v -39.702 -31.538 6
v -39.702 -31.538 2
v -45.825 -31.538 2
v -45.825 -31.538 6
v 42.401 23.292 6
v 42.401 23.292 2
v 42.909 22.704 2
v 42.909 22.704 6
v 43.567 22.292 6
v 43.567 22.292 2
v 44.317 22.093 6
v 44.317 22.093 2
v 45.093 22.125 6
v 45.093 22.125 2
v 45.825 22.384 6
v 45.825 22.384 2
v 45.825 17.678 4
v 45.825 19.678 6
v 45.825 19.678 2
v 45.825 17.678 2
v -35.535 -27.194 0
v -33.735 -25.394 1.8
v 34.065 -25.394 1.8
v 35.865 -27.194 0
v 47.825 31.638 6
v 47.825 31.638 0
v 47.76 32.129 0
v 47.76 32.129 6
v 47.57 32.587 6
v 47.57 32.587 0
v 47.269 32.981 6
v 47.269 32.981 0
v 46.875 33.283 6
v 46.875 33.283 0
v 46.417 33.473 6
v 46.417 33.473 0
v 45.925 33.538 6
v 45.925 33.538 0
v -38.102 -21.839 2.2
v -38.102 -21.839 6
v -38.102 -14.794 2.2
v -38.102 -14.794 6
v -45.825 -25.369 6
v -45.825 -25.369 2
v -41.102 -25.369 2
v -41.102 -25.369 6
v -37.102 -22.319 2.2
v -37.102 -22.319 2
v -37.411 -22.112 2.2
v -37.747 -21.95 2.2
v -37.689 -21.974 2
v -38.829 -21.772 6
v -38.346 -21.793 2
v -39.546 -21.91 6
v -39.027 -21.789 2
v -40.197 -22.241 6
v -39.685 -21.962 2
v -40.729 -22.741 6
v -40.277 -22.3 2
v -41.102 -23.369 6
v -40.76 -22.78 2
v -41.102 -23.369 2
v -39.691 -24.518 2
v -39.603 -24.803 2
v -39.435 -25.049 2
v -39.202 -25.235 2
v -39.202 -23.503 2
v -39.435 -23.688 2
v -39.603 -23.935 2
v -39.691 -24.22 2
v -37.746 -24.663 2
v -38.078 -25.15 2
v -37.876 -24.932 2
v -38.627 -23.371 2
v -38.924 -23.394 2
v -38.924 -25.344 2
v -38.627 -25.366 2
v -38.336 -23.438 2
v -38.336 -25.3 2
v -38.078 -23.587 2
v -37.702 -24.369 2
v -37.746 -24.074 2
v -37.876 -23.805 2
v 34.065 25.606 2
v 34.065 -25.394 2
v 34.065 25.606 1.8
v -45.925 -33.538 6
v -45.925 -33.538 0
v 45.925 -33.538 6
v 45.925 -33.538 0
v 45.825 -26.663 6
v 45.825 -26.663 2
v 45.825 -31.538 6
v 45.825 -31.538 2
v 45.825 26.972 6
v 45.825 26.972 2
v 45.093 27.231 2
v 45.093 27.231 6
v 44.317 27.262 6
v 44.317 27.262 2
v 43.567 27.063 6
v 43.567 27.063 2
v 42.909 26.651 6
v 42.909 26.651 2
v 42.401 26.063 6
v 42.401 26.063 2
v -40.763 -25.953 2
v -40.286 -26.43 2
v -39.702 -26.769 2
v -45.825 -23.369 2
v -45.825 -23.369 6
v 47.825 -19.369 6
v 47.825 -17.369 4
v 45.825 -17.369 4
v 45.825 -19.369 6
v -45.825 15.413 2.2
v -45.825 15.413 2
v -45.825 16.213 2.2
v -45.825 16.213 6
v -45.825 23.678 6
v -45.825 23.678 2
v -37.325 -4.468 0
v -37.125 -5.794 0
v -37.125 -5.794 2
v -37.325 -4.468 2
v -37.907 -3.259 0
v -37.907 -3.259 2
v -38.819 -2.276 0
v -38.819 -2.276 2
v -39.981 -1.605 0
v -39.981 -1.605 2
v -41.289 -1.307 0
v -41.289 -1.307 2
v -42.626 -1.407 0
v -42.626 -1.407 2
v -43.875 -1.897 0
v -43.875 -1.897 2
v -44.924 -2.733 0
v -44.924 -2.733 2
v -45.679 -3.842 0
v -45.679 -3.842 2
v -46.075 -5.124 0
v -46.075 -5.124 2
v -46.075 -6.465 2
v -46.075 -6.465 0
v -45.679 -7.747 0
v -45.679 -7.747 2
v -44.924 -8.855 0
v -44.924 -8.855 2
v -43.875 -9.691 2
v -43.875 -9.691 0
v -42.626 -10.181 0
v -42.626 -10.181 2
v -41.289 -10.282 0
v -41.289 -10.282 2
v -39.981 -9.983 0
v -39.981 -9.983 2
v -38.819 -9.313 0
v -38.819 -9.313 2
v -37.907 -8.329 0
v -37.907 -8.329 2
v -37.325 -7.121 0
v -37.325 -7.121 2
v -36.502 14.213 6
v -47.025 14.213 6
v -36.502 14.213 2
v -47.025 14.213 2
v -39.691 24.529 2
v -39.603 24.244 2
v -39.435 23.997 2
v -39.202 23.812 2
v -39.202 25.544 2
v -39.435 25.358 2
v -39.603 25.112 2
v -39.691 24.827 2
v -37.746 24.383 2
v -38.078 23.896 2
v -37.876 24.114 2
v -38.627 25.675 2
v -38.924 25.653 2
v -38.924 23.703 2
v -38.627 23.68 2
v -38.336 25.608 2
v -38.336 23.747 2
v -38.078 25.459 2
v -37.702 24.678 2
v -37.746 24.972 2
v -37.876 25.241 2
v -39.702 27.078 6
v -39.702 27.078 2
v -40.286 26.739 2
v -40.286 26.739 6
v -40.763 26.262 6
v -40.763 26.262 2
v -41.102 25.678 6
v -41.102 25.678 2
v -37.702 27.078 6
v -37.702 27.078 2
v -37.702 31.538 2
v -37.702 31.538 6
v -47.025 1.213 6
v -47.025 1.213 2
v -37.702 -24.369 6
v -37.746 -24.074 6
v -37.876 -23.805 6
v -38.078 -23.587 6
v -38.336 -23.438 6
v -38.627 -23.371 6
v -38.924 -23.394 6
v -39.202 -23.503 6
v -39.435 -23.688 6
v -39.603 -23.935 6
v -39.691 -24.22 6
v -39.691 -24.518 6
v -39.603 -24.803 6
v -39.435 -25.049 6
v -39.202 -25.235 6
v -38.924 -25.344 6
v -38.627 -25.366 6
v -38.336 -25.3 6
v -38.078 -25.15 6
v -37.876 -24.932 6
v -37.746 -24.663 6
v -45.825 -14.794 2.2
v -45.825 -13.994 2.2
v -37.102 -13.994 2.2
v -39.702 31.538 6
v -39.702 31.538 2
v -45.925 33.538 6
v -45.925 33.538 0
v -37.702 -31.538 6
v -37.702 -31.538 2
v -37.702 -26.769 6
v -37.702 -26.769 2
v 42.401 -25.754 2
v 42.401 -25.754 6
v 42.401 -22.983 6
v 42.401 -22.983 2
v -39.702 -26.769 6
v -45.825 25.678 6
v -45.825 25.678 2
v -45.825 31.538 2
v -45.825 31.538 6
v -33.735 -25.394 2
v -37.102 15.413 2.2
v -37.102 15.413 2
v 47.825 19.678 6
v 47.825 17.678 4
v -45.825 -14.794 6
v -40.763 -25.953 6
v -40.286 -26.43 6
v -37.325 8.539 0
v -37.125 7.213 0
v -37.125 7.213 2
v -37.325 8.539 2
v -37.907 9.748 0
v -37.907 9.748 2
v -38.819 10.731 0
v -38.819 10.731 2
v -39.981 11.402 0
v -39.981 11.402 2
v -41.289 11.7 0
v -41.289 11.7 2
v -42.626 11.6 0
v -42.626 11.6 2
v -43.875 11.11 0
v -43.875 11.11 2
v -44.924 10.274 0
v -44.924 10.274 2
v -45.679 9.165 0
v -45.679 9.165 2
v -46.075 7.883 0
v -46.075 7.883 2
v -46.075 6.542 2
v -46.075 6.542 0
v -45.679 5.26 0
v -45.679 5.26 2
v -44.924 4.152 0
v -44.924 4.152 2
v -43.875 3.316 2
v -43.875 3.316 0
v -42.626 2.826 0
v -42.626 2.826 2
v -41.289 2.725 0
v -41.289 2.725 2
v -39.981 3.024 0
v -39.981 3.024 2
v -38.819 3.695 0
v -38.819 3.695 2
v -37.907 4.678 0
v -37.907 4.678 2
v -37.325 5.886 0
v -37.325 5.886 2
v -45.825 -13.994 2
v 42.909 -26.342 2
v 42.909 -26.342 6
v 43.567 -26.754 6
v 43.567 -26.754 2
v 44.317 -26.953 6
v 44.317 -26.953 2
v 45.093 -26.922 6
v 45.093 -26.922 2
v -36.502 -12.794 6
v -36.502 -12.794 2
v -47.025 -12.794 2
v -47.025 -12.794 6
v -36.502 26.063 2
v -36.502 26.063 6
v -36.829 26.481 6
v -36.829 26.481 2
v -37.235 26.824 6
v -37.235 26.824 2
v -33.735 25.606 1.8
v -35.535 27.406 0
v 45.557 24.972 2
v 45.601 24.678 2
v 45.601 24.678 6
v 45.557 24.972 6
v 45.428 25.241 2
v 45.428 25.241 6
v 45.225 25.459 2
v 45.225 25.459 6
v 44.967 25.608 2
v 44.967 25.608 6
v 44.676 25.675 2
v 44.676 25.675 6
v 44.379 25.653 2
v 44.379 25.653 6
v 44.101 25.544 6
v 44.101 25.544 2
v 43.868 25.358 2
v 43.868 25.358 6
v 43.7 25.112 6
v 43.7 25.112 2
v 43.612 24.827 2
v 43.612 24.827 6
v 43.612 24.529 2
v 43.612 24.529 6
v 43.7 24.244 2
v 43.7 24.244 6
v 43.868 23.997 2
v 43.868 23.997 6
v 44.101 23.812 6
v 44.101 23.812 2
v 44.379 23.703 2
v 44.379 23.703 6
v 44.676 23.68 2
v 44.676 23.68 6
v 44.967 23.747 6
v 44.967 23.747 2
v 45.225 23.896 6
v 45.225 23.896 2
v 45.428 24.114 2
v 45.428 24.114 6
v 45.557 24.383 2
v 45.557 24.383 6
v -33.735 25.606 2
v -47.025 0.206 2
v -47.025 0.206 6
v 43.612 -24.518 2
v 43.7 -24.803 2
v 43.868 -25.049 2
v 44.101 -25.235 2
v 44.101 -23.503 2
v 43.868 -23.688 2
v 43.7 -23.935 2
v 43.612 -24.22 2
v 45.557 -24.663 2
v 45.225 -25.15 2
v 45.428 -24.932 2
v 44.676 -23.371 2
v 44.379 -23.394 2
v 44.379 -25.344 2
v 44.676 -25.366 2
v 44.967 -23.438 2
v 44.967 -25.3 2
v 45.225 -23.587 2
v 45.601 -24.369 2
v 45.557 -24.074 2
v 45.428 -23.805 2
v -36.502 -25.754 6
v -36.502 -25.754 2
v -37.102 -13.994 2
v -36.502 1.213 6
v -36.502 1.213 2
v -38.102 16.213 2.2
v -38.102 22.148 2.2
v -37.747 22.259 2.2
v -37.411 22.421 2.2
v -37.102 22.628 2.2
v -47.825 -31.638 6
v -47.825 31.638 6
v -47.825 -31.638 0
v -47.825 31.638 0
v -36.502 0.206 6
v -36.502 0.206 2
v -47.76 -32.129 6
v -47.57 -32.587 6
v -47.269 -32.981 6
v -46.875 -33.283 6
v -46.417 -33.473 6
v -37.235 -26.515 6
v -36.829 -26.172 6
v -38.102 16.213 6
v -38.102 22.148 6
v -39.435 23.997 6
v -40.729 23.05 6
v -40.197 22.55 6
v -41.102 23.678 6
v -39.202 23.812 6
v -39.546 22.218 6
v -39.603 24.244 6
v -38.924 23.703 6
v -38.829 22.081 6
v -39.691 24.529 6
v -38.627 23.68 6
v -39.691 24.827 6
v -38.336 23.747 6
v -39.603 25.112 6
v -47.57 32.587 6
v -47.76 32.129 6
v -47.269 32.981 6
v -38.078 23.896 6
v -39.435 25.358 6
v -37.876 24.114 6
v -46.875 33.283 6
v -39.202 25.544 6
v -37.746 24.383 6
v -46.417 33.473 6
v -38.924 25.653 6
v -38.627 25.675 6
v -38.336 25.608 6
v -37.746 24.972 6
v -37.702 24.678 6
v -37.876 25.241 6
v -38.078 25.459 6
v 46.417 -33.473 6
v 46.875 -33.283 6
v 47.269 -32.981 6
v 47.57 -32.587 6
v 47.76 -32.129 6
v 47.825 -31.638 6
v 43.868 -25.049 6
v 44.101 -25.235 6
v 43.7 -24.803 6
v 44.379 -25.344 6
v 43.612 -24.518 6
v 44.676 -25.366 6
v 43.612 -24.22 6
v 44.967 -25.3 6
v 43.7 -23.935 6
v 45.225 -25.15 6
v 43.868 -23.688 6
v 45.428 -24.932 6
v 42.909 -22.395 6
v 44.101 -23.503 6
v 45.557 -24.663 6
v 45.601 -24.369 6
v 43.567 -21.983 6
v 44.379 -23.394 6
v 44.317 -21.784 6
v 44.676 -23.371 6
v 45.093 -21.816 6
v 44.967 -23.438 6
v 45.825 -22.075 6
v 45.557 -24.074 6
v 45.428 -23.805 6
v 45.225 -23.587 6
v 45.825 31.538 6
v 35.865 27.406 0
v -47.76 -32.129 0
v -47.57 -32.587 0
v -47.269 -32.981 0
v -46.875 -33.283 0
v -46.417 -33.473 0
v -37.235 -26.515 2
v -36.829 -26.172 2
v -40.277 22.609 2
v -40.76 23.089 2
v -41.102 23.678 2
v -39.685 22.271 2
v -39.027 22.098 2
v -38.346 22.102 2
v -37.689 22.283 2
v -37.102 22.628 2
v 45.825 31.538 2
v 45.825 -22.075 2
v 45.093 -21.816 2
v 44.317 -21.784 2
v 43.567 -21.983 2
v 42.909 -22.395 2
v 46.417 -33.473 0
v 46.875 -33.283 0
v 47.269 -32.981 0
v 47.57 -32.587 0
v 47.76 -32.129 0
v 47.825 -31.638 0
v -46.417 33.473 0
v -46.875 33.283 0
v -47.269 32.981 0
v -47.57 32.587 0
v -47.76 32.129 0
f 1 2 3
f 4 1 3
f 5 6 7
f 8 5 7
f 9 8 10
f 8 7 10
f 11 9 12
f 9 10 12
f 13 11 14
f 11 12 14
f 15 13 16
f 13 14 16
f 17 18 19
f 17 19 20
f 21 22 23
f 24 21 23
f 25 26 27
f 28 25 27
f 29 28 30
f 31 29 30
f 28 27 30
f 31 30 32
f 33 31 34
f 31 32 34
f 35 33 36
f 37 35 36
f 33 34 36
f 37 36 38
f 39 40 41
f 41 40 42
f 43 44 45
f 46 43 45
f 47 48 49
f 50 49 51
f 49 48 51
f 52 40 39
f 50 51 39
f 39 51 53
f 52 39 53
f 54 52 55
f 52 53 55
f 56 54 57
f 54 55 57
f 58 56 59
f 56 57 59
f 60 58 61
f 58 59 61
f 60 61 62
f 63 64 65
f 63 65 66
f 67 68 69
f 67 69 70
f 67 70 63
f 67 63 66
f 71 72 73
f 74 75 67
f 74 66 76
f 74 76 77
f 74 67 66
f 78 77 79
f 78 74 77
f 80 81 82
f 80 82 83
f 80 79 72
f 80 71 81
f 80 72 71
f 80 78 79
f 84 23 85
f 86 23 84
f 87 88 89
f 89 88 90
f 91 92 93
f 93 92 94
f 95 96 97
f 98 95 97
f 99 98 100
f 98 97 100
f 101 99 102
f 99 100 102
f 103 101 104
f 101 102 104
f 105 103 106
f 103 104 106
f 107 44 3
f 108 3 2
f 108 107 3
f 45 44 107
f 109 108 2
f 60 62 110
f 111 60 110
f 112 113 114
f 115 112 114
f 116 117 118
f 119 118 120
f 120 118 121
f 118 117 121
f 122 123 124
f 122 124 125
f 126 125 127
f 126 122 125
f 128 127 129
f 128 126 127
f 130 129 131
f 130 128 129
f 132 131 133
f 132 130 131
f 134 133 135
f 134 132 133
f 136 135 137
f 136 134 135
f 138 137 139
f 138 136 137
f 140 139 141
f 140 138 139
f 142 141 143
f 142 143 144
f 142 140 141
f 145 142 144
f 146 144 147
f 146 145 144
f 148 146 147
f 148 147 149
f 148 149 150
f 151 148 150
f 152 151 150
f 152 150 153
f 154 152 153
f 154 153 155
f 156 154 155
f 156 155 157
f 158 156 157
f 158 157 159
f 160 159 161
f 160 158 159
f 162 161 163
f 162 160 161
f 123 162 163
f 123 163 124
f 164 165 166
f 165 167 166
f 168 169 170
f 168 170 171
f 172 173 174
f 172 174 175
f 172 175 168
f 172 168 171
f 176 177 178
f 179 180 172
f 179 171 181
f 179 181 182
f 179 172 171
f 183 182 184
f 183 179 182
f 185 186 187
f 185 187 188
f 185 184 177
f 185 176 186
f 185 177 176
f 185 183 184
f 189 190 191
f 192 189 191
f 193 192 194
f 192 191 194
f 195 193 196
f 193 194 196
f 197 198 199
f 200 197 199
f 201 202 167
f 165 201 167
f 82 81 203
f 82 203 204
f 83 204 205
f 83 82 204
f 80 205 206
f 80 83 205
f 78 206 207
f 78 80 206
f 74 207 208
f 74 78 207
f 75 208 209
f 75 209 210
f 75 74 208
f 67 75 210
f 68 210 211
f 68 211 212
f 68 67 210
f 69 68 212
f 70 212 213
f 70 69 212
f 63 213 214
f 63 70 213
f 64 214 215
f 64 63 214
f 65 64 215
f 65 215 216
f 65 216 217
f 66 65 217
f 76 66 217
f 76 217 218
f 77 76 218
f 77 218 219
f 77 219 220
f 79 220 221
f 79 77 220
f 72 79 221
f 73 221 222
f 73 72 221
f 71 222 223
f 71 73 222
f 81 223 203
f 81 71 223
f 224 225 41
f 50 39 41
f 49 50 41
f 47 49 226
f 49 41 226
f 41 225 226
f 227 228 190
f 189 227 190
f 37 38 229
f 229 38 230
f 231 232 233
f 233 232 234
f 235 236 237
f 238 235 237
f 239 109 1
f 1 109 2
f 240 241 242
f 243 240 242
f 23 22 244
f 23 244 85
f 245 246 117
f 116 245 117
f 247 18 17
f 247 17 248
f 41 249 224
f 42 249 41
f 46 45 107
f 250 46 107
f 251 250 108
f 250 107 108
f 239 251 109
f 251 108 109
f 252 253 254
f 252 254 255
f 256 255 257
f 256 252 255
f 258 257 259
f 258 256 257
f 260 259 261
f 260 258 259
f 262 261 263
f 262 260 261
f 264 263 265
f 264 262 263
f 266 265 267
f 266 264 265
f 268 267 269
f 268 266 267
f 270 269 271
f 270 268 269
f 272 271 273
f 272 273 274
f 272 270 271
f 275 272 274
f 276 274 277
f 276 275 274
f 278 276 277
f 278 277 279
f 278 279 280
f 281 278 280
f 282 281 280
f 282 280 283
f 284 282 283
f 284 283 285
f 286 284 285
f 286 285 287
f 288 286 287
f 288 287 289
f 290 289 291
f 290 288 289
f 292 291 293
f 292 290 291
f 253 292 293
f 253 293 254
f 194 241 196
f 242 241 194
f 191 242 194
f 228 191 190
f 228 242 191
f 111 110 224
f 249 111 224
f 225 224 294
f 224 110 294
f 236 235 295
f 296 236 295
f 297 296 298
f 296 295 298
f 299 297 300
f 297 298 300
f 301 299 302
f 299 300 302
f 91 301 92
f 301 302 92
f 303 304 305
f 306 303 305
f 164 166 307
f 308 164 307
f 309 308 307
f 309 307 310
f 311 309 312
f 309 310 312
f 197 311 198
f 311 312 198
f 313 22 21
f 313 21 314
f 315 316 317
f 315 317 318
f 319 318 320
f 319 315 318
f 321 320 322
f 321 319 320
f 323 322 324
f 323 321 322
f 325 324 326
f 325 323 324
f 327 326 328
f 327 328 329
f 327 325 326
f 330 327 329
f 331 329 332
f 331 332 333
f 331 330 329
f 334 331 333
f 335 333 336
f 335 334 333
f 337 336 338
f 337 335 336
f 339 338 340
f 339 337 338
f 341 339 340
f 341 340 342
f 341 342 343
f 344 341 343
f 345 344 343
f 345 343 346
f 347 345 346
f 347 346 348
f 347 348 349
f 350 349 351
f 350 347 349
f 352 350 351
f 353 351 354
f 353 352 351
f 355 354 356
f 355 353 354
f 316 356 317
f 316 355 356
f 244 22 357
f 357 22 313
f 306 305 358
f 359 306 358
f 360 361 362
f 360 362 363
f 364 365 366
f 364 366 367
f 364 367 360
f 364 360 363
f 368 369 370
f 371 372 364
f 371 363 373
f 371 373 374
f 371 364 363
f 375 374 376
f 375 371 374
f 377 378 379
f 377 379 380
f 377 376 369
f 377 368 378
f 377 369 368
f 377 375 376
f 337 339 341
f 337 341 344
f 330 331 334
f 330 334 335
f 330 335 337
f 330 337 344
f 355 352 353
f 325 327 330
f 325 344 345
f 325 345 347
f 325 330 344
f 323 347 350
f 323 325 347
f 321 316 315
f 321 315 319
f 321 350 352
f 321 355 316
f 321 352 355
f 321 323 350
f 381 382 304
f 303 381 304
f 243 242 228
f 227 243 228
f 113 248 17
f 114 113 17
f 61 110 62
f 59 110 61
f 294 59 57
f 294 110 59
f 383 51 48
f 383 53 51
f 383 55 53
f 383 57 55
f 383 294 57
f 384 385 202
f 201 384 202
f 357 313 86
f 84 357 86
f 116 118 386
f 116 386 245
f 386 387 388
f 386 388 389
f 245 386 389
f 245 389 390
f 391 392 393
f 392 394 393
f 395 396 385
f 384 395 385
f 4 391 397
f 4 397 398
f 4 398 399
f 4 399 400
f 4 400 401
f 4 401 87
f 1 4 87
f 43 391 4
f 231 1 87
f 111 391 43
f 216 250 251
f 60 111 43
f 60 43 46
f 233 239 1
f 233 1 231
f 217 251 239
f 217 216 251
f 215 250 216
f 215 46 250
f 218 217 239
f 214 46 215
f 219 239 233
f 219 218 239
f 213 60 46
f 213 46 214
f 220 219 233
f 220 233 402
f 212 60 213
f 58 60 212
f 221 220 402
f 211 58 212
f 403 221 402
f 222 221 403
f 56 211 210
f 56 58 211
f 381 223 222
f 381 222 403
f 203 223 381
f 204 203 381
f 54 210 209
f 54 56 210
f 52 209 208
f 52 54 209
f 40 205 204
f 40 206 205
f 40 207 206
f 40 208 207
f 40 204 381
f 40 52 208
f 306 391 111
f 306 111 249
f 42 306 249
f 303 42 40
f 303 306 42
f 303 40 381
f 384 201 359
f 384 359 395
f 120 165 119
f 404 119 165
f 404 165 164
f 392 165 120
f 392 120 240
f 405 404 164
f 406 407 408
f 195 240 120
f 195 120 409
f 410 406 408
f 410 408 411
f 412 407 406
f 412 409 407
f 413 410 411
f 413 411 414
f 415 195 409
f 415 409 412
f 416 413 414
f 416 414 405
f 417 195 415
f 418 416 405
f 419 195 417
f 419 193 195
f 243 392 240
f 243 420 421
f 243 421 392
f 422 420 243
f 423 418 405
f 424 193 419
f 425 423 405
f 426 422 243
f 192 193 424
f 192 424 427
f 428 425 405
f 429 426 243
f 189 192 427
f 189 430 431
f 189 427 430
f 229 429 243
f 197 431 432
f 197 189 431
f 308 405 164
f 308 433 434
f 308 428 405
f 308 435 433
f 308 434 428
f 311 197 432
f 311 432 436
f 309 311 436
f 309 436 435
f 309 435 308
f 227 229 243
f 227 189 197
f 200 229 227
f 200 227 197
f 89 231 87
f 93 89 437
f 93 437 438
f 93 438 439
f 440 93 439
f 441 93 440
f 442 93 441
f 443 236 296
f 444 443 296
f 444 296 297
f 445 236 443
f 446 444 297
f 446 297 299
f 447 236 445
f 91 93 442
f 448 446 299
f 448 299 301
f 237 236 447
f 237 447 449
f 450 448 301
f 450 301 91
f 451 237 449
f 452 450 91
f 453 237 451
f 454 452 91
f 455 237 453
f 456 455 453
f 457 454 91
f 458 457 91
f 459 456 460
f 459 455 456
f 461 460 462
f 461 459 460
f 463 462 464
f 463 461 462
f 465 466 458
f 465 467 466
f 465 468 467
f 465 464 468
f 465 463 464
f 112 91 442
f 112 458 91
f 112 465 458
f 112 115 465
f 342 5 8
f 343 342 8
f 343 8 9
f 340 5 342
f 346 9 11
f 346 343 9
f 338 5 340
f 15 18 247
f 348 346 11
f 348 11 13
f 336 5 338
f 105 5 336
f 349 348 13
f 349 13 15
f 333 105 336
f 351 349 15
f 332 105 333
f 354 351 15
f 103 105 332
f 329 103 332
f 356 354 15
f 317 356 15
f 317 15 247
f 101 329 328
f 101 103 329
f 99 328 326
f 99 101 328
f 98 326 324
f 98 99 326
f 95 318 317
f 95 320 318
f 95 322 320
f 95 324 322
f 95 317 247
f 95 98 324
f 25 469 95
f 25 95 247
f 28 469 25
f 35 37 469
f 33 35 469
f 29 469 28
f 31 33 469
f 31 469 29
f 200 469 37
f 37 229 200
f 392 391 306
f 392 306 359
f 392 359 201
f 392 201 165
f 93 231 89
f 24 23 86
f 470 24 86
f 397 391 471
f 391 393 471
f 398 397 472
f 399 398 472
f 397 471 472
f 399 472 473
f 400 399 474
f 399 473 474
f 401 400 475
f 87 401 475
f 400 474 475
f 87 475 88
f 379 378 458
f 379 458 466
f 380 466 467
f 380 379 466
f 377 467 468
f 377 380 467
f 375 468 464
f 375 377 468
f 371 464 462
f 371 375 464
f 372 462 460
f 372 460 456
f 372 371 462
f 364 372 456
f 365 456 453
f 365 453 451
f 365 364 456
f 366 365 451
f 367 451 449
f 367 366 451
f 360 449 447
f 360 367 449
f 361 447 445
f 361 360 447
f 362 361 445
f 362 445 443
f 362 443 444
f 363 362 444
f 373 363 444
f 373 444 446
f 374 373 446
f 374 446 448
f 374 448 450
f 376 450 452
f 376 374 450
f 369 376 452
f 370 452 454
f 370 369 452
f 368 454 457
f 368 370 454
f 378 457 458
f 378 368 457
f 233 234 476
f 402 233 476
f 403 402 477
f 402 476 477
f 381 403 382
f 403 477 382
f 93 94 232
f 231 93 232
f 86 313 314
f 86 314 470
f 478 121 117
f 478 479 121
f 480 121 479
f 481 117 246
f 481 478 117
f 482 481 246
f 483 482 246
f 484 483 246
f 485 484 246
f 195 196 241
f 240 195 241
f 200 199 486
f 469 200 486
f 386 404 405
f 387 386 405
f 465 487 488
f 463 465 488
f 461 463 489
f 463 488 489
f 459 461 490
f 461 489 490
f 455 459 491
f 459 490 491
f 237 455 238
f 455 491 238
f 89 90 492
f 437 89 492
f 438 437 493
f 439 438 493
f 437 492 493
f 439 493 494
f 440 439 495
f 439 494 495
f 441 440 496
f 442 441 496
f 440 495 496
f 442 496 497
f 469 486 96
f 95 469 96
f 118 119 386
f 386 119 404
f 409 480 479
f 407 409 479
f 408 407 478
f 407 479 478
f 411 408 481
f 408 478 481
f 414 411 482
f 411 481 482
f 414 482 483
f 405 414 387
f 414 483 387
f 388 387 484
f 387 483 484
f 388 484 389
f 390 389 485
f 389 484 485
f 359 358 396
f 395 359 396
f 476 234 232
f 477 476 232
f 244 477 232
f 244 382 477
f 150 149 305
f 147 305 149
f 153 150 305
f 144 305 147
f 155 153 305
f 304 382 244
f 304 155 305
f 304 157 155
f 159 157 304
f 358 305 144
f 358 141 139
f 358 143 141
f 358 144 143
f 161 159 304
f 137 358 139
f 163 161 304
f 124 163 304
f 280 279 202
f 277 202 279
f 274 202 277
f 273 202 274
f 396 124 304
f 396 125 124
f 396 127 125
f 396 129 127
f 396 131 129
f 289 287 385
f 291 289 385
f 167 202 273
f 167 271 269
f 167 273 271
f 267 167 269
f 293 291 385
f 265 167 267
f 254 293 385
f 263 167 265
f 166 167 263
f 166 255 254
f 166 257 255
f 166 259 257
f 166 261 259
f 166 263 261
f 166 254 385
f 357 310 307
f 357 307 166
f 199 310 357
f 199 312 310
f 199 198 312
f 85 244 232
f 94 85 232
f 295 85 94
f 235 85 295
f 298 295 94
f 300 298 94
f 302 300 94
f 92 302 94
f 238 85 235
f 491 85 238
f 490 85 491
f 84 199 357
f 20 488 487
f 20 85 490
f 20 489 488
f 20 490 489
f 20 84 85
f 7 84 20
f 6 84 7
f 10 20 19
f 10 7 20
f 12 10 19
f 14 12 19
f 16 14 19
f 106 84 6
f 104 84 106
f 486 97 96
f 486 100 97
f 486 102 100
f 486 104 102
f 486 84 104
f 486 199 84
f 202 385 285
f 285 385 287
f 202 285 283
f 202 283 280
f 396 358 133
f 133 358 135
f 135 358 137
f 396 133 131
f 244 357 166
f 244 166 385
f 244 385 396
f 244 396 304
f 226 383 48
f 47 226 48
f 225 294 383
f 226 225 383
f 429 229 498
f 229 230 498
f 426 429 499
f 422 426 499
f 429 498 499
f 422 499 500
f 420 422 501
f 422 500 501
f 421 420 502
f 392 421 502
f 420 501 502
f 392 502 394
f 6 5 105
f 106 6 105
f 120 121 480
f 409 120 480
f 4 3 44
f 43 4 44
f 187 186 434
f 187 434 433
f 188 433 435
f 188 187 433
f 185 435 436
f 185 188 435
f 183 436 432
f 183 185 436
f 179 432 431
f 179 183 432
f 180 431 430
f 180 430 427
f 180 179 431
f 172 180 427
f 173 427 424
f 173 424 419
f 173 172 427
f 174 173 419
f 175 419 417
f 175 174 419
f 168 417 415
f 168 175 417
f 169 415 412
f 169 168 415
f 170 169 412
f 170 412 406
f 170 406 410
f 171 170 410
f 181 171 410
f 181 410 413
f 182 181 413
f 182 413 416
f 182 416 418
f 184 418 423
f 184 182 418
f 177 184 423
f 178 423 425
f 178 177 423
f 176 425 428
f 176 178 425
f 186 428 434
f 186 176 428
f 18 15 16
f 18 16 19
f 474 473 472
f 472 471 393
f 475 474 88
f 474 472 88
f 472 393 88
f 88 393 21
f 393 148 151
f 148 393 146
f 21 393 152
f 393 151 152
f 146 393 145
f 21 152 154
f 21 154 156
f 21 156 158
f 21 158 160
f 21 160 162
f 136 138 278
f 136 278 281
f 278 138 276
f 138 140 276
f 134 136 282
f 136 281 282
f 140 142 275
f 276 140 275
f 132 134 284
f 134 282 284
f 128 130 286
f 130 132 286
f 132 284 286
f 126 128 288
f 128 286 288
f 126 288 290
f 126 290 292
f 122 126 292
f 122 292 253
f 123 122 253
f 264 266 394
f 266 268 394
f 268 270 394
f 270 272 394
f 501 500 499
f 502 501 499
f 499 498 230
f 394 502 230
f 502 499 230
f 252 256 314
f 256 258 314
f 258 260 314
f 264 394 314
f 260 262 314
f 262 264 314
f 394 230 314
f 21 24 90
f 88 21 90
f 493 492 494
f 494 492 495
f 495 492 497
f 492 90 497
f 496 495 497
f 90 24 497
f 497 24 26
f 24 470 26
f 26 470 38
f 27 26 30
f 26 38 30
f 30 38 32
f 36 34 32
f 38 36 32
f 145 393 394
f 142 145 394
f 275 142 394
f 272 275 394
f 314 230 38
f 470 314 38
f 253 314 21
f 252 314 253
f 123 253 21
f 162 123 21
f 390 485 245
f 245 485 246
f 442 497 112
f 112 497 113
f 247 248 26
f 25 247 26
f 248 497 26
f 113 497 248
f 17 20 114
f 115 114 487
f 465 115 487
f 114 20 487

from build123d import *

# Parameters (mm, degrees)
SKETCH_2_R          = 4.5
SKETCH_2_W          = 67.8
SKETCH_2_H          = 51
EXTRUDE_1_DEPTH     = 2
SKETCH_3_R          = 1
EXTRUDE_2_DEPTH     = 4
SKETCH_4_W          = 7.723167142
SKETCH_4_H          = 2
SKETCH_4_W_2        = 2
SKETCH_4_H_2        = 9
SKETCH_4_H_3        = 10
EXTRUDE_3_DEPTH     = 3.8
CUT_EXTRUDE_1_DEPTH = 2
CHAMFER_2_SIZE      = 2
SKETCH_6_W          = 78.903110185
SKETCH_6_H          = 60.07500003
CUT_EXTRUDE_2_DEPTH = 4
CHAMFER_3_SIZE      = 1.8


with BuildPart() as part:
    # Эскиз2 → Бобышка-Вытянуть1 (new body)
    with BuildSketch(Plane.XY):
        with BuildLine():
            Line((-47.825, 31.6375), (-47.825, -31.6375))
            ThreePointArc((-47.825, -31.6375), (-47.268502884, -32.981002884), (-45.925, -33.5375))
            Line((-45.925, -33.5375), (45.925, -33.5375))
            ThreePointArc((45.925, -33.5375), (47.268502884, -32.981002884), (47.825, -31.6375))
            Line((47.825, -31.6375), (47.825, -19.36863872))
            Line((47.825, -19.36863872), (47.825, -17.36863872))
            Line((47.825, -17.36863872), (47.825, 17.677620675))
            Line((47.825, 17.677620675), (47.825, 19.677620675))
            Line((47.825, 19.677620675), (47.825, 31.6375))
            ThreePointArc((47.825, 31.6375), (47.268502884, 32.981002884), (45.925, 33.5375))
            Line((45.925, 33.5375), (-45.925, 33.5375))
            ThreePointArc((-45.925, 33.5375), (-47.268502884, 32.981002884), (-47.825, 31.6375))
        make_face()
        with Locations((-41.625, 7.212805211)):
            Circle(SKETCH_2_R, mode=Mode.SUBTRACT)
        with Locations((-41.625, -5.794271444)):
            Circle(SKETCH_2_R, mode=Mode.SUBTRACT)
        with Locations((0.165, 0.106266667)):
            Rectangle(SKETCH_2_W, SKETCH_2_H, mode=Mode.SUBTRACT)
    extrude(amount=EXTRUDE_1_DEPTH)

    # Эскиз3 → Бобышка-Вытянуть2 (add)
    with BuildSketch(Plane.XY.offset(2)):
        with BuildLine():
            ThreePointArc((47.825, 31.6375), (47.268502884, 32.981002884), (45.925, 33.5375))
            Line((45.925, 33.5375), (-45.925, 33.5375))
            ThreePointArc((-45.925, 33.5375), (-47.268502884, 32.981002884), (-47.825, 31.6375))
            Line((-47.825, 31.6375), (-47.825, -31.6375))
            ThreePointArc((-47.825, -31.6375), (-47.268502884, -32.981002884), (-45.925, -33.5375))
            Line((-45.925, -33.5375), (45.925, -33.5375))
            ThreePointArc((45.925, -33.5375), (47.268502884, -32.981002884), (47.825, -31.6375))
            Line((47.825, -31.6375), (47.825, 31.6375))
        make_face()
        with BuildLine():
            ThreePointArc((-41.101832747, -25.36863872), (-40.540310378, -26.207116351), (-39.701832747, -26.76863872))
            Line((-39.701832747, -26.76863872), (-39.701832747, -31.5375))
            Line((-39.701832747, -31.5375), (-45.825, -31.5375))
            Line((-45.825, -31.5375), (-45.825, -25.36863872))
            Line((-45.825, -25.36863872), (-41.101832747, -25.36863872))
        make_face(mode=Mode.SUBTRACT)
        with Locations((-38.701832747, -24.36863872)):
            Circle(SKETCH_3_R, mode=Mode.SUBTRACT)
        with BuildLine():
            ThreePointArc((-37.101832747, -22.319248567), (-39.361609166, -21.853744075), (-41.101832747, -23.36863872))
            Line((-41.101832747, -23.36863872), (-45.825, -23.36863872))
            Line((-45.825, -23.36863872), (-45.825, -13.994271444))
            Line((-45.825, -13.994271444), (-37.101832747, -13.994271444))
            Line((-37.101832747, -13.994271444), (-37.101832747, -22.319248567))
        make_face(mode=Mode.SUBTRACT)
        with Locations((44.601277438, -24.36863872)):
            Circle(SKETCH_3_R, mode=Mode.SUBTRACT)
        with BuildLine():
            Line((-36.101832858, 1.212805211), (-36.501832747, 1.212805211))
            Line((-36.501832747, 1.212805211), (-47.025, 1.212805211))
            Line((-47.025, 1.212805211), (-47.025, 14.212805211))
            Line((-47.025, 14.212805211), (-36.501832747, 14.212805211))
            Line((-36.501832747, 14.212805211), (-36.101832858, 14.212805211))
            Line((-36.101832858, 14.212805211), (-36.101832858, 24.677620706))
            ThreePointArc((-36.101832858, 24.677620706), (-36.538502092, 26.119841216), (-37.701832858, 27.077620706))
            Line((-37.701832858, 27.077620706), (-37.701832858, 31.53750003))
            Line((-37.701832858, 31.53750003), (45.824999889, 31.53750003))
            Line((45.824999889, 31.53750003), (45.824999889, 26.971635329))
            ThreePointArc((45.824999889, 26.971635329), (42.001277327, 24.677620706), (45.824999889, 22.383606083))
            Line((45.824999889, 22.383606083), (45.824999889, 19.677620706))
            Line((45.824999889, 19.677620706), (45.825, 17.677620675))
            Line((45.825, 17.677620675), (45.825, -17.36863872))
            Line((45.825, -17.36863872), (45.825, -19.36863872))
            Line((45.825, -19.36863872), (45.825, -22.074624097))
            ThreePointArc((45.825, -22.074624097), (42.001277438, -24.36863872), (45.825, -26.662653343))
            Line((45.825, -26.662653343), (45.825, -31.5375))
            Line((45.825, -31.5375), (-37.701832747, -31.5375))
            Line((-37.701832747, -31.5375), (-37.701832747, -26.76863872))
            ThreePointArc((-37.701832747, -26.76863872), (-36.538272941, -25.81051562), (-36.101832858, -24.367812827))
            Line((-36.101832858, -24.367812827), (-36.101832858, -12.794271444))
            Line((-36.101832858, -12.794271444), (-36.501832747, -12.794271444))
            Line((-36.501832747, -12.794271444), (-47.025, -12.794271444))
            Line((-47.025, -12.794271444), (-47.025, 0.205728556))
            Line((-47.025, 0.205728556), (-36.501832747, 0.205728556))
            Line((-36.501832747, 0.205728556), (-36.101832858, 0.205728556))
            Line((-36.101832858, 0.205728556), (-36.101832858, 1.212805211))
        make_face(mode=Mode.SUBTRACT)
        with BuildLine():
            Line((-45.825, 15.412805211), (-45.825, 23.677620675))
            Line((-45.825, 23.677620675), (-41.101832747, 23.677620675))
            ThreePointArc((-41.101832747, 23.677620675), (-39.361609166, 22.16272603), (-37.101832747, 22.628230522))
            Line((-37.101832747, 22.628230522), (-37.101832747, 15.412805211))
            Line((-37.101832747, 15.412805211), (-45.825, 15.412805211))
        make_face(mode=Mode.SUBTRACT)
        with Locations((-38.701832747, 24.677620675)):
            Circle(SKETCH_3_R, mode=Mode.SUBTRACT)
        with BuildLine():
            Line((-45.825, 25.677620675), (-45.825, 31.5375))
            Line((-45.825, 31.5375), (-39.701832747, 31.5375))
            Line((-39.701832747, 31.5375), (-39.701832747, 27.077620675))
            ThreePointArc((-39.701832747, 27.077620675), (-40.540310378, 26.516098306), (-41.101832747, 25.677620675))
            Line((-41.101832747, 25.677620675), (-45.825, 25.677620675))
        make_face(mode=Mode.SUBTRACT)
        with Locations((44.601277438, 24.677620675)):
            Circle(SKETCH_3_R, mode=Mode.SUBTRACT)
    extrude(amount=EXTRUDE_2_DEPTH)

    # Эскиз4 → Бобышка-Вытянуть3 (add)
    with BuildSketch(Plane.XY.offset(6)):
        with Locations((-41.963416429, 15.212805211)):
            Rectangle(SKETCH_4_W, SKETCH_4_H)
        with Locations((-37.101832858, 18.712805211)):
            Rectangle(SKETCH_4_W_2, SKETCH_4_H_2)
        with Locations((-41.963416429, -13.794271444)):
            Rectangle(SKETCH_4_W, SKETCH_4_H)
        with Locations((-37.101832858, -17.794271444)):
            Rectangle(SKETCH_4_W_2, SKETCH_4_H_3)
    extrude(amount=-EXTRUDE_3_DEPTH)

    # Эскиз5 → Вырез-Вытянуть1 (cut)
    with BuildSketch(Plane.XY.offset(6)):
        Polygon((47.825, -17.36863872), (47.825, -19.36863872), (45.825, -19.36863872), (45.825, -17.36863872), (45.825, 17.677620675), (45.824999889, 19.677620706), (47.825, 19.677620706), (47.825, 17.677620675), align=None)
    extrude(amount=-CUT_EXTRUDE_1_DEPTH, mode=Mode.SUBTRACT)

    # Фаска2
    chamfer_2_edges = [part.edges().sort_by_distance(p)[0] for p in [
        (46.824999945, 19.677620706, 4),
        (46.825, -19.36863872, 4),
    ]]
    chamfer(chamfer_2_edges, length=CHAMFER_2_SIZE - 0.0001)  # a hair under: the kernel refuses the full size

    # Эскиз6 → Вырез-Вытянуть2 (cut)
    with BuildSketch(Plane.XY.offset(2)):
        with Locations((2.949722235, 0.500000015)):
            Rectangle(SKETCH_6_W, SKETCH_6_H)
    extrude(amount=CUT_EXTRUDE_2_DEPTH, mode=Mode.SUBTRACT)

    # Фаска3
    chamfer_3_edges = [part.edges().sort_by_distance(p)[0] for p in [
        (34.065, 0.106266667, 0),
        (0.165, 25.606266667, 0),
        (-33.735, 0.106266667, 0),
        (0.165, -25.393733333, 0),
    ]]
    chamfer(chamfer_3_edges, length=CHAMFER_3_SIZE)


solid = part.part
